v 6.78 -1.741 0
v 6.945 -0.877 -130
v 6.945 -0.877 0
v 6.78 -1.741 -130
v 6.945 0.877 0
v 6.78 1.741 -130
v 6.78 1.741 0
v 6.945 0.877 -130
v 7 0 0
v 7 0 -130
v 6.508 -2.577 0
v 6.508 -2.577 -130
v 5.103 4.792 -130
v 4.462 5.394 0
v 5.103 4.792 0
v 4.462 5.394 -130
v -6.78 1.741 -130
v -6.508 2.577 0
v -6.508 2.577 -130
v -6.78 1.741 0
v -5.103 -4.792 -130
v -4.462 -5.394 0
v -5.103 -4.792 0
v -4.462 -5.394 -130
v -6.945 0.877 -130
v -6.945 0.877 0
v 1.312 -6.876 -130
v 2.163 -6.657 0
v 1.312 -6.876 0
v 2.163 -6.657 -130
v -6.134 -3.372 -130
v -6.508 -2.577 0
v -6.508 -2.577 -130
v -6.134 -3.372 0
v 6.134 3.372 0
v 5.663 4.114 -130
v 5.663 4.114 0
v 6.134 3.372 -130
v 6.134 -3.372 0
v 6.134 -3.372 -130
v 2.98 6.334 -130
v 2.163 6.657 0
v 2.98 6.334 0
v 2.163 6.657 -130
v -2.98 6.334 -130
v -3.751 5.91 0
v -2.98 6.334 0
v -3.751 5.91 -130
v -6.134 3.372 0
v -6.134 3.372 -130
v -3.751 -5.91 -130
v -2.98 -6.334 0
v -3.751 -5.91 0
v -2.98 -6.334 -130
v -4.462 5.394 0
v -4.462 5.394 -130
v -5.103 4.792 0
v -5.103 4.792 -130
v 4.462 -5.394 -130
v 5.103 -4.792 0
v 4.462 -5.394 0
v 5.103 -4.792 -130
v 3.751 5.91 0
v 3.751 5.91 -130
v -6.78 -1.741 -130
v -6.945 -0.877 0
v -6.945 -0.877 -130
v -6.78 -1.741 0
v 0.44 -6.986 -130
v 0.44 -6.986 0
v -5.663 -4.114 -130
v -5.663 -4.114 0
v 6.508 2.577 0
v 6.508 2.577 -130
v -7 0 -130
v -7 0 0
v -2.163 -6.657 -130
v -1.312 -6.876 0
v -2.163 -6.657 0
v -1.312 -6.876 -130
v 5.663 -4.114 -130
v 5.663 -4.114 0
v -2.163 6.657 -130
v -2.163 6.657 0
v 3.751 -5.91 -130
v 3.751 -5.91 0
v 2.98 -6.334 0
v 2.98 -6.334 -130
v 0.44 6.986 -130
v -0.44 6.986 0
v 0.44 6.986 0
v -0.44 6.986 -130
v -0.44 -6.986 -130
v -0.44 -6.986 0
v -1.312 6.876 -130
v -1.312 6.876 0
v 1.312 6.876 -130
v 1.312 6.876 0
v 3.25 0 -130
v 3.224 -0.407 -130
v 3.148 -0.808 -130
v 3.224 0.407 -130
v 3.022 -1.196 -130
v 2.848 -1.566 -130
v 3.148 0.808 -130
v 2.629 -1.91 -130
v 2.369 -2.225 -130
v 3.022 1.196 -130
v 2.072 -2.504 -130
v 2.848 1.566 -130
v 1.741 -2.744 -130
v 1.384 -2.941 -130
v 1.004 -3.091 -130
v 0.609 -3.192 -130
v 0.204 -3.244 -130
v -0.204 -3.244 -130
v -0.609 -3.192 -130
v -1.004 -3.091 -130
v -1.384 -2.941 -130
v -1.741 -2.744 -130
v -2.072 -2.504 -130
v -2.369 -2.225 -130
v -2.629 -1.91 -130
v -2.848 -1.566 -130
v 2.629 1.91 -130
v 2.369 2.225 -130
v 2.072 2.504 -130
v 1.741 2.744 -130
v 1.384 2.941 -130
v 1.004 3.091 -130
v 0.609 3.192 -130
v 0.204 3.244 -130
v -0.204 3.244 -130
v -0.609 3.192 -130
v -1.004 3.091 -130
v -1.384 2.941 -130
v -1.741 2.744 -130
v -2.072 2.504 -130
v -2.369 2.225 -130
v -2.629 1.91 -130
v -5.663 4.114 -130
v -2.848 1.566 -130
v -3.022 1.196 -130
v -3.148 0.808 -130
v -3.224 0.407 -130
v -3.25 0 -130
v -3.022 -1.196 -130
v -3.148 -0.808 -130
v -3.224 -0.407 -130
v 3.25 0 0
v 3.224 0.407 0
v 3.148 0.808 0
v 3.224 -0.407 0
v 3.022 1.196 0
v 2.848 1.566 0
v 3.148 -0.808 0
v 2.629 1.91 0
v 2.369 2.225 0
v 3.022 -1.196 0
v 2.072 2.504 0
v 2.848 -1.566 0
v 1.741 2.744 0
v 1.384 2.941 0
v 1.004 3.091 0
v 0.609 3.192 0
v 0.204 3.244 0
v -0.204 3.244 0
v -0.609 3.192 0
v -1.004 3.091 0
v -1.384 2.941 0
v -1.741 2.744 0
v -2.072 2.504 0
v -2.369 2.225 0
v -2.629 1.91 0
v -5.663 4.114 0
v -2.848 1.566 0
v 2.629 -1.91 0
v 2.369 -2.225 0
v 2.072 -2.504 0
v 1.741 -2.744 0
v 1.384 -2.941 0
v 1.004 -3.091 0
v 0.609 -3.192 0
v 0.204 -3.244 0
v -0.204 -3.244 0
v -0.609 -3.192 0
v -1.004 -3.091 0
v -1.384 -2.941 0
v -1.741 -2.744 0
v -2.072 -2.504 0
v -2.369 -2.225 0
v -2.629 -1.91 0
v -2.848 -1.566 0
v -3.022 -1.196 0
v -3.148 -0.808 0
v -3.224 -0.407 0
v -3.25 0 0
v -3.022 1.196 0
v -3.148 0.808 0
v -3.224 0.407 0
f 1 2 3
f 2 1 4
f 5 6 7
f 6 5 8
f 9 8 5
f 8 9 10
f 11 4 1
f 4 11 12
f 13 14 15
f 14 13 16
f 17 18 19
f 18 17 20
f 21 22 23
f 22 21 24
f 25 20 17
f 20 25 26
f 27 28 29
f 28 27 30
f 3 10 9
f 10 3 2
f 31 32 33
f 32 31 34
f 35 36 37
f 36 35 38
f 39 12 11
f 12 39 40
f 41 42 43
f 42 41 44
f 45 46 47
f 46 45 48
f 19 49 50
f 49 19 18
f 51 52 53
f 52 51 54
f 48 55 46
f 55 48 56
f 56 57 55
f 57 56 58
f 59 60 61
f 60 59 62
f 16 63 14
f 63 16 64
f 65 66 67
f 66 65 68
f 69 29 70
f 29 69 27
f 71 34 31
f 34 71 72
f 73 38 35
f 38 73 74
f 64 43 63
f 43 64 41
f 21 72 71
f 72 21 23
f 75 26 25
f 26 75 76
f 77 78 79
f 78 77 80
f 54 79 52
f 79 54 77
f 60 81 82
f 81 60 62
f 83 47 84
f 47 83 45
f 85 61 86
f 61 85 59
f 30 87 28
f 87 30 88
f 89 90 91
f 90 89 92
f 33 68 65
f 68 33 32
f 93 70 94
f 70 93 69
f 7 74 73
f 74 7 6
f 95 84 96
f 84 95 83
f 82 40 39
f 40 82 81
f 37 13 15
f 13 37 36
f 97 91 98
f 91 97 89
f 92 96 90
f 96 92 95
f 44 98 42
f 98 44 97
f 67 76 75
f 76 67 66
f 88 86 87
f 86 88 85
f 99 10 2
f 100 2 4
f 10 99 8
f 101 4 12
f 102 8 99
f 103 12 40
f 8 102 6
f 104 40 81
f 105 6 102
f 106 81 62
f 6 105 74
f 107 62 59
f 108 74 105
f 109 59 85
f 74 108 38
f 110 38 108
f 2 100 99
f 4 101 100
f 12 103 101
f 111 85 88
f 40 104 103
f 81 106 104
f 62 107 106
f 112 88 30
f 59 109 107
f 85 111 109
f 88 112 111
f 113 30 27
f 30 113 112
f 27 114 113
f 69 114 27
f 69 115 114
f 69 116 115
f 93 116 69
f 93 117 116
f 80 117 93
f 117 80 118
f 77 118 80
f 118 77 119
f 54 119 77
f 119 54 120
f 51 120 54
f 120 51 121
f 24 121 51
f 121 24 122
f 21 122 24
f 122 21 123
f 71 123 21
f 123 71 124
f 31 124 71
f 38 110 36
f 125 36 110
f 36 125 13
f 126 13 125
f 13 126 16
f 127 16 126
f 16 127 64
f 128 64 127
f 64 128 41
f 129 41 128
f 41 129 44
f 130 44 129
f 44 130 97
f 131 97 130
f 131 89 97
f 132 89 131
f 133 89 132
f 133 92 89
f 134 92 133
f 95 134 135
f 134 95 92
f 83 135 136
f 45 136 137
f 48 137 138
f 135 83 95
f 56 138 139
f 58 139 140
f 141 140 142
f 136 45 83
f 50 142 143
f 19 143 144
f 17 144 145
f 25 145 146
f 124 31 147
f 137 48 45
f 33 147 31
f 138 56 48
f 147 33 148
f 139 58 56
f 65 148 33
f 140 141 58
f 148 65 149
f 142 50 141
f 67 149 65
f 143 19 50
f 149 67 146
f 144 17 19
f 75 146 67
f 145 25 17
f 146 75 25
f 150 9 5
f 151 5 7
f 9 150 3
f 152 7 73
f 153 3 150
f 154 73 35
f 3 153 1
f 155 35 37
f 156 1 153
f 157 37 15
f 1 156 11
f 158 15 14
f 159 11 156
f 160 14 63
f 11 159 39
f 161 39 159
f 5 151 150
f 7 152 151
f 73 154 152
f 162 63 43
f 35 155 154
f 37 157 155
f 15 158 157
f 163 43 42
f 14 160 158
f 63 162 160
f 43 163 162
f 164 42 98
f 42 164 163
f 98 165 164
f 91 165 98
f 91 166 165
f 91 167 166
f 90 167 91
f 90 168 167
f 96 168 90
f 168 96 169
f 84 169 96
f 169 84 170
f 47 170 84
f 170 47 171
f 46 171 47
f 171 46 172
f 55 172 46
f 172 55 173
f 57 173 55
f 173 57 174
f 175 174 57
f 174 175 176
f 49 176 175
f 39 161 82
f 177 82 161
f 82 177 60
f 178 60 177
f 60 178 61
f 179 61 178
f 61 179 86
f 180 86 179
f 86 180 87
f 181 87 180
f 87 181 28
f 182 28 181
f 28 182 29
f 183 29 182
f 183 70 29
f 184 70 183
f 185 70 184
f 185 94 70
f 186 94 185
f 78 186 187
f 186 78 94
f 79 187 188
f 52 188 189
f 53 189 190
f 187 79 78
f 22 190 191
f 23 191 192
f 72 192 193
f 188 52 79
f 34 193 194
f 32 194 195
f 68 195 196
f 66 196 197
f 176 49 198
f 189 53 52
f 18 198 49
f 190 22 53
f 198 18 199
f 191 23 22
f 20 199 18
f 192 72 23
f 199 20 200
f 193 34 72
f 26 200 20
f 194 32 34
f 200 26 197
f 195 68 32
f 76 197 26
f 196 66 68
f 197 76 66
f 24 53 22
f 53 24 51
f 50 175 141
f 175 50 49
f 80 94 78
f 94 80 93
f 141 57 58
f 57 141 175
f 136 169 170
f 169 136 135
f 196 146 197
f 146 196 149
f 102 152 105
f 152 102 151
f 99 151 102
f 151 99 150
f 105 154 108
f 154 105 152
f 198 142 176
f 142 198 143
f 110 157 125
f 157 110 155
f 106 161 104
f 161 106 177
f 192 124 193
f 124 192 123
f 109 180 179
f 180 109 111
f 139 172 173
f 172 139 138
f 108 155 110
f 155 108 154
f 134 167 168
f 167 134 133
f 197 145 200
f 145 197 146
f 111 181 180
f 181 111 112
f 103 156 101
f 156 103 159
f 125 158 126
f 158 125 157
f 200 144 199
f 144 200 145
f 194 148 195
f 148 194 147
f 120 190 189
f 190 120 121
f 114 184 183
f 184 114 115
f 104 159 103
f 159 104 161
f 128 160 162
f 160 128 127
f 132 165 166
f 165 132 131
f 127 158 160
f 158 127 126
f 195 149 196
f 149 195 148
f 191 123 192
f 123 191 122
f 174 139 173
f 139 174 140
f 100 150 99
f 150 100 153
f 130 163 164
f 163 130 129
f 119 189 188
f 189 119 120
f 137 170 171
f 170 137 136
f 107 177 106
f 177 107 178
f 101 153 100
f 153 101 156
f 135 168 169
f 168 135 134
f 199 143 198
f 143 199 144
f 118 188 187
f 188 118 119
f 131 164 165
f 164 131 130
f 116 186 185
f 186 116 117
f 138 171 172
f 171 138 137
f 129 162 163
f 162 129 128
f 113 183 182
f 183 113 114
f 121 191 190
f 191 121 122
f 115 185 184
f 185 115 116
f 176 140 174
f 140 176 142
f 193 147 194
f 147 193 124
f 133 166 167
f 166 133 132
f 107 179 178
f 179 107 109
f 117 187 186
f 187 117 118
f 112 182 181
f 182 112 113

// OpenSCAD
$fn = 50;


difference() {
	union() {
		translate(v = [0, 0, -130.0000000000]) {
			cylinder(h = 130, r = 7.0000000000);
		}
	}
	union() {
		#translate(v = [0, 0, -130]) {
			cylinder(h = 130, r = 3.2500000000);
		}
	}
}
